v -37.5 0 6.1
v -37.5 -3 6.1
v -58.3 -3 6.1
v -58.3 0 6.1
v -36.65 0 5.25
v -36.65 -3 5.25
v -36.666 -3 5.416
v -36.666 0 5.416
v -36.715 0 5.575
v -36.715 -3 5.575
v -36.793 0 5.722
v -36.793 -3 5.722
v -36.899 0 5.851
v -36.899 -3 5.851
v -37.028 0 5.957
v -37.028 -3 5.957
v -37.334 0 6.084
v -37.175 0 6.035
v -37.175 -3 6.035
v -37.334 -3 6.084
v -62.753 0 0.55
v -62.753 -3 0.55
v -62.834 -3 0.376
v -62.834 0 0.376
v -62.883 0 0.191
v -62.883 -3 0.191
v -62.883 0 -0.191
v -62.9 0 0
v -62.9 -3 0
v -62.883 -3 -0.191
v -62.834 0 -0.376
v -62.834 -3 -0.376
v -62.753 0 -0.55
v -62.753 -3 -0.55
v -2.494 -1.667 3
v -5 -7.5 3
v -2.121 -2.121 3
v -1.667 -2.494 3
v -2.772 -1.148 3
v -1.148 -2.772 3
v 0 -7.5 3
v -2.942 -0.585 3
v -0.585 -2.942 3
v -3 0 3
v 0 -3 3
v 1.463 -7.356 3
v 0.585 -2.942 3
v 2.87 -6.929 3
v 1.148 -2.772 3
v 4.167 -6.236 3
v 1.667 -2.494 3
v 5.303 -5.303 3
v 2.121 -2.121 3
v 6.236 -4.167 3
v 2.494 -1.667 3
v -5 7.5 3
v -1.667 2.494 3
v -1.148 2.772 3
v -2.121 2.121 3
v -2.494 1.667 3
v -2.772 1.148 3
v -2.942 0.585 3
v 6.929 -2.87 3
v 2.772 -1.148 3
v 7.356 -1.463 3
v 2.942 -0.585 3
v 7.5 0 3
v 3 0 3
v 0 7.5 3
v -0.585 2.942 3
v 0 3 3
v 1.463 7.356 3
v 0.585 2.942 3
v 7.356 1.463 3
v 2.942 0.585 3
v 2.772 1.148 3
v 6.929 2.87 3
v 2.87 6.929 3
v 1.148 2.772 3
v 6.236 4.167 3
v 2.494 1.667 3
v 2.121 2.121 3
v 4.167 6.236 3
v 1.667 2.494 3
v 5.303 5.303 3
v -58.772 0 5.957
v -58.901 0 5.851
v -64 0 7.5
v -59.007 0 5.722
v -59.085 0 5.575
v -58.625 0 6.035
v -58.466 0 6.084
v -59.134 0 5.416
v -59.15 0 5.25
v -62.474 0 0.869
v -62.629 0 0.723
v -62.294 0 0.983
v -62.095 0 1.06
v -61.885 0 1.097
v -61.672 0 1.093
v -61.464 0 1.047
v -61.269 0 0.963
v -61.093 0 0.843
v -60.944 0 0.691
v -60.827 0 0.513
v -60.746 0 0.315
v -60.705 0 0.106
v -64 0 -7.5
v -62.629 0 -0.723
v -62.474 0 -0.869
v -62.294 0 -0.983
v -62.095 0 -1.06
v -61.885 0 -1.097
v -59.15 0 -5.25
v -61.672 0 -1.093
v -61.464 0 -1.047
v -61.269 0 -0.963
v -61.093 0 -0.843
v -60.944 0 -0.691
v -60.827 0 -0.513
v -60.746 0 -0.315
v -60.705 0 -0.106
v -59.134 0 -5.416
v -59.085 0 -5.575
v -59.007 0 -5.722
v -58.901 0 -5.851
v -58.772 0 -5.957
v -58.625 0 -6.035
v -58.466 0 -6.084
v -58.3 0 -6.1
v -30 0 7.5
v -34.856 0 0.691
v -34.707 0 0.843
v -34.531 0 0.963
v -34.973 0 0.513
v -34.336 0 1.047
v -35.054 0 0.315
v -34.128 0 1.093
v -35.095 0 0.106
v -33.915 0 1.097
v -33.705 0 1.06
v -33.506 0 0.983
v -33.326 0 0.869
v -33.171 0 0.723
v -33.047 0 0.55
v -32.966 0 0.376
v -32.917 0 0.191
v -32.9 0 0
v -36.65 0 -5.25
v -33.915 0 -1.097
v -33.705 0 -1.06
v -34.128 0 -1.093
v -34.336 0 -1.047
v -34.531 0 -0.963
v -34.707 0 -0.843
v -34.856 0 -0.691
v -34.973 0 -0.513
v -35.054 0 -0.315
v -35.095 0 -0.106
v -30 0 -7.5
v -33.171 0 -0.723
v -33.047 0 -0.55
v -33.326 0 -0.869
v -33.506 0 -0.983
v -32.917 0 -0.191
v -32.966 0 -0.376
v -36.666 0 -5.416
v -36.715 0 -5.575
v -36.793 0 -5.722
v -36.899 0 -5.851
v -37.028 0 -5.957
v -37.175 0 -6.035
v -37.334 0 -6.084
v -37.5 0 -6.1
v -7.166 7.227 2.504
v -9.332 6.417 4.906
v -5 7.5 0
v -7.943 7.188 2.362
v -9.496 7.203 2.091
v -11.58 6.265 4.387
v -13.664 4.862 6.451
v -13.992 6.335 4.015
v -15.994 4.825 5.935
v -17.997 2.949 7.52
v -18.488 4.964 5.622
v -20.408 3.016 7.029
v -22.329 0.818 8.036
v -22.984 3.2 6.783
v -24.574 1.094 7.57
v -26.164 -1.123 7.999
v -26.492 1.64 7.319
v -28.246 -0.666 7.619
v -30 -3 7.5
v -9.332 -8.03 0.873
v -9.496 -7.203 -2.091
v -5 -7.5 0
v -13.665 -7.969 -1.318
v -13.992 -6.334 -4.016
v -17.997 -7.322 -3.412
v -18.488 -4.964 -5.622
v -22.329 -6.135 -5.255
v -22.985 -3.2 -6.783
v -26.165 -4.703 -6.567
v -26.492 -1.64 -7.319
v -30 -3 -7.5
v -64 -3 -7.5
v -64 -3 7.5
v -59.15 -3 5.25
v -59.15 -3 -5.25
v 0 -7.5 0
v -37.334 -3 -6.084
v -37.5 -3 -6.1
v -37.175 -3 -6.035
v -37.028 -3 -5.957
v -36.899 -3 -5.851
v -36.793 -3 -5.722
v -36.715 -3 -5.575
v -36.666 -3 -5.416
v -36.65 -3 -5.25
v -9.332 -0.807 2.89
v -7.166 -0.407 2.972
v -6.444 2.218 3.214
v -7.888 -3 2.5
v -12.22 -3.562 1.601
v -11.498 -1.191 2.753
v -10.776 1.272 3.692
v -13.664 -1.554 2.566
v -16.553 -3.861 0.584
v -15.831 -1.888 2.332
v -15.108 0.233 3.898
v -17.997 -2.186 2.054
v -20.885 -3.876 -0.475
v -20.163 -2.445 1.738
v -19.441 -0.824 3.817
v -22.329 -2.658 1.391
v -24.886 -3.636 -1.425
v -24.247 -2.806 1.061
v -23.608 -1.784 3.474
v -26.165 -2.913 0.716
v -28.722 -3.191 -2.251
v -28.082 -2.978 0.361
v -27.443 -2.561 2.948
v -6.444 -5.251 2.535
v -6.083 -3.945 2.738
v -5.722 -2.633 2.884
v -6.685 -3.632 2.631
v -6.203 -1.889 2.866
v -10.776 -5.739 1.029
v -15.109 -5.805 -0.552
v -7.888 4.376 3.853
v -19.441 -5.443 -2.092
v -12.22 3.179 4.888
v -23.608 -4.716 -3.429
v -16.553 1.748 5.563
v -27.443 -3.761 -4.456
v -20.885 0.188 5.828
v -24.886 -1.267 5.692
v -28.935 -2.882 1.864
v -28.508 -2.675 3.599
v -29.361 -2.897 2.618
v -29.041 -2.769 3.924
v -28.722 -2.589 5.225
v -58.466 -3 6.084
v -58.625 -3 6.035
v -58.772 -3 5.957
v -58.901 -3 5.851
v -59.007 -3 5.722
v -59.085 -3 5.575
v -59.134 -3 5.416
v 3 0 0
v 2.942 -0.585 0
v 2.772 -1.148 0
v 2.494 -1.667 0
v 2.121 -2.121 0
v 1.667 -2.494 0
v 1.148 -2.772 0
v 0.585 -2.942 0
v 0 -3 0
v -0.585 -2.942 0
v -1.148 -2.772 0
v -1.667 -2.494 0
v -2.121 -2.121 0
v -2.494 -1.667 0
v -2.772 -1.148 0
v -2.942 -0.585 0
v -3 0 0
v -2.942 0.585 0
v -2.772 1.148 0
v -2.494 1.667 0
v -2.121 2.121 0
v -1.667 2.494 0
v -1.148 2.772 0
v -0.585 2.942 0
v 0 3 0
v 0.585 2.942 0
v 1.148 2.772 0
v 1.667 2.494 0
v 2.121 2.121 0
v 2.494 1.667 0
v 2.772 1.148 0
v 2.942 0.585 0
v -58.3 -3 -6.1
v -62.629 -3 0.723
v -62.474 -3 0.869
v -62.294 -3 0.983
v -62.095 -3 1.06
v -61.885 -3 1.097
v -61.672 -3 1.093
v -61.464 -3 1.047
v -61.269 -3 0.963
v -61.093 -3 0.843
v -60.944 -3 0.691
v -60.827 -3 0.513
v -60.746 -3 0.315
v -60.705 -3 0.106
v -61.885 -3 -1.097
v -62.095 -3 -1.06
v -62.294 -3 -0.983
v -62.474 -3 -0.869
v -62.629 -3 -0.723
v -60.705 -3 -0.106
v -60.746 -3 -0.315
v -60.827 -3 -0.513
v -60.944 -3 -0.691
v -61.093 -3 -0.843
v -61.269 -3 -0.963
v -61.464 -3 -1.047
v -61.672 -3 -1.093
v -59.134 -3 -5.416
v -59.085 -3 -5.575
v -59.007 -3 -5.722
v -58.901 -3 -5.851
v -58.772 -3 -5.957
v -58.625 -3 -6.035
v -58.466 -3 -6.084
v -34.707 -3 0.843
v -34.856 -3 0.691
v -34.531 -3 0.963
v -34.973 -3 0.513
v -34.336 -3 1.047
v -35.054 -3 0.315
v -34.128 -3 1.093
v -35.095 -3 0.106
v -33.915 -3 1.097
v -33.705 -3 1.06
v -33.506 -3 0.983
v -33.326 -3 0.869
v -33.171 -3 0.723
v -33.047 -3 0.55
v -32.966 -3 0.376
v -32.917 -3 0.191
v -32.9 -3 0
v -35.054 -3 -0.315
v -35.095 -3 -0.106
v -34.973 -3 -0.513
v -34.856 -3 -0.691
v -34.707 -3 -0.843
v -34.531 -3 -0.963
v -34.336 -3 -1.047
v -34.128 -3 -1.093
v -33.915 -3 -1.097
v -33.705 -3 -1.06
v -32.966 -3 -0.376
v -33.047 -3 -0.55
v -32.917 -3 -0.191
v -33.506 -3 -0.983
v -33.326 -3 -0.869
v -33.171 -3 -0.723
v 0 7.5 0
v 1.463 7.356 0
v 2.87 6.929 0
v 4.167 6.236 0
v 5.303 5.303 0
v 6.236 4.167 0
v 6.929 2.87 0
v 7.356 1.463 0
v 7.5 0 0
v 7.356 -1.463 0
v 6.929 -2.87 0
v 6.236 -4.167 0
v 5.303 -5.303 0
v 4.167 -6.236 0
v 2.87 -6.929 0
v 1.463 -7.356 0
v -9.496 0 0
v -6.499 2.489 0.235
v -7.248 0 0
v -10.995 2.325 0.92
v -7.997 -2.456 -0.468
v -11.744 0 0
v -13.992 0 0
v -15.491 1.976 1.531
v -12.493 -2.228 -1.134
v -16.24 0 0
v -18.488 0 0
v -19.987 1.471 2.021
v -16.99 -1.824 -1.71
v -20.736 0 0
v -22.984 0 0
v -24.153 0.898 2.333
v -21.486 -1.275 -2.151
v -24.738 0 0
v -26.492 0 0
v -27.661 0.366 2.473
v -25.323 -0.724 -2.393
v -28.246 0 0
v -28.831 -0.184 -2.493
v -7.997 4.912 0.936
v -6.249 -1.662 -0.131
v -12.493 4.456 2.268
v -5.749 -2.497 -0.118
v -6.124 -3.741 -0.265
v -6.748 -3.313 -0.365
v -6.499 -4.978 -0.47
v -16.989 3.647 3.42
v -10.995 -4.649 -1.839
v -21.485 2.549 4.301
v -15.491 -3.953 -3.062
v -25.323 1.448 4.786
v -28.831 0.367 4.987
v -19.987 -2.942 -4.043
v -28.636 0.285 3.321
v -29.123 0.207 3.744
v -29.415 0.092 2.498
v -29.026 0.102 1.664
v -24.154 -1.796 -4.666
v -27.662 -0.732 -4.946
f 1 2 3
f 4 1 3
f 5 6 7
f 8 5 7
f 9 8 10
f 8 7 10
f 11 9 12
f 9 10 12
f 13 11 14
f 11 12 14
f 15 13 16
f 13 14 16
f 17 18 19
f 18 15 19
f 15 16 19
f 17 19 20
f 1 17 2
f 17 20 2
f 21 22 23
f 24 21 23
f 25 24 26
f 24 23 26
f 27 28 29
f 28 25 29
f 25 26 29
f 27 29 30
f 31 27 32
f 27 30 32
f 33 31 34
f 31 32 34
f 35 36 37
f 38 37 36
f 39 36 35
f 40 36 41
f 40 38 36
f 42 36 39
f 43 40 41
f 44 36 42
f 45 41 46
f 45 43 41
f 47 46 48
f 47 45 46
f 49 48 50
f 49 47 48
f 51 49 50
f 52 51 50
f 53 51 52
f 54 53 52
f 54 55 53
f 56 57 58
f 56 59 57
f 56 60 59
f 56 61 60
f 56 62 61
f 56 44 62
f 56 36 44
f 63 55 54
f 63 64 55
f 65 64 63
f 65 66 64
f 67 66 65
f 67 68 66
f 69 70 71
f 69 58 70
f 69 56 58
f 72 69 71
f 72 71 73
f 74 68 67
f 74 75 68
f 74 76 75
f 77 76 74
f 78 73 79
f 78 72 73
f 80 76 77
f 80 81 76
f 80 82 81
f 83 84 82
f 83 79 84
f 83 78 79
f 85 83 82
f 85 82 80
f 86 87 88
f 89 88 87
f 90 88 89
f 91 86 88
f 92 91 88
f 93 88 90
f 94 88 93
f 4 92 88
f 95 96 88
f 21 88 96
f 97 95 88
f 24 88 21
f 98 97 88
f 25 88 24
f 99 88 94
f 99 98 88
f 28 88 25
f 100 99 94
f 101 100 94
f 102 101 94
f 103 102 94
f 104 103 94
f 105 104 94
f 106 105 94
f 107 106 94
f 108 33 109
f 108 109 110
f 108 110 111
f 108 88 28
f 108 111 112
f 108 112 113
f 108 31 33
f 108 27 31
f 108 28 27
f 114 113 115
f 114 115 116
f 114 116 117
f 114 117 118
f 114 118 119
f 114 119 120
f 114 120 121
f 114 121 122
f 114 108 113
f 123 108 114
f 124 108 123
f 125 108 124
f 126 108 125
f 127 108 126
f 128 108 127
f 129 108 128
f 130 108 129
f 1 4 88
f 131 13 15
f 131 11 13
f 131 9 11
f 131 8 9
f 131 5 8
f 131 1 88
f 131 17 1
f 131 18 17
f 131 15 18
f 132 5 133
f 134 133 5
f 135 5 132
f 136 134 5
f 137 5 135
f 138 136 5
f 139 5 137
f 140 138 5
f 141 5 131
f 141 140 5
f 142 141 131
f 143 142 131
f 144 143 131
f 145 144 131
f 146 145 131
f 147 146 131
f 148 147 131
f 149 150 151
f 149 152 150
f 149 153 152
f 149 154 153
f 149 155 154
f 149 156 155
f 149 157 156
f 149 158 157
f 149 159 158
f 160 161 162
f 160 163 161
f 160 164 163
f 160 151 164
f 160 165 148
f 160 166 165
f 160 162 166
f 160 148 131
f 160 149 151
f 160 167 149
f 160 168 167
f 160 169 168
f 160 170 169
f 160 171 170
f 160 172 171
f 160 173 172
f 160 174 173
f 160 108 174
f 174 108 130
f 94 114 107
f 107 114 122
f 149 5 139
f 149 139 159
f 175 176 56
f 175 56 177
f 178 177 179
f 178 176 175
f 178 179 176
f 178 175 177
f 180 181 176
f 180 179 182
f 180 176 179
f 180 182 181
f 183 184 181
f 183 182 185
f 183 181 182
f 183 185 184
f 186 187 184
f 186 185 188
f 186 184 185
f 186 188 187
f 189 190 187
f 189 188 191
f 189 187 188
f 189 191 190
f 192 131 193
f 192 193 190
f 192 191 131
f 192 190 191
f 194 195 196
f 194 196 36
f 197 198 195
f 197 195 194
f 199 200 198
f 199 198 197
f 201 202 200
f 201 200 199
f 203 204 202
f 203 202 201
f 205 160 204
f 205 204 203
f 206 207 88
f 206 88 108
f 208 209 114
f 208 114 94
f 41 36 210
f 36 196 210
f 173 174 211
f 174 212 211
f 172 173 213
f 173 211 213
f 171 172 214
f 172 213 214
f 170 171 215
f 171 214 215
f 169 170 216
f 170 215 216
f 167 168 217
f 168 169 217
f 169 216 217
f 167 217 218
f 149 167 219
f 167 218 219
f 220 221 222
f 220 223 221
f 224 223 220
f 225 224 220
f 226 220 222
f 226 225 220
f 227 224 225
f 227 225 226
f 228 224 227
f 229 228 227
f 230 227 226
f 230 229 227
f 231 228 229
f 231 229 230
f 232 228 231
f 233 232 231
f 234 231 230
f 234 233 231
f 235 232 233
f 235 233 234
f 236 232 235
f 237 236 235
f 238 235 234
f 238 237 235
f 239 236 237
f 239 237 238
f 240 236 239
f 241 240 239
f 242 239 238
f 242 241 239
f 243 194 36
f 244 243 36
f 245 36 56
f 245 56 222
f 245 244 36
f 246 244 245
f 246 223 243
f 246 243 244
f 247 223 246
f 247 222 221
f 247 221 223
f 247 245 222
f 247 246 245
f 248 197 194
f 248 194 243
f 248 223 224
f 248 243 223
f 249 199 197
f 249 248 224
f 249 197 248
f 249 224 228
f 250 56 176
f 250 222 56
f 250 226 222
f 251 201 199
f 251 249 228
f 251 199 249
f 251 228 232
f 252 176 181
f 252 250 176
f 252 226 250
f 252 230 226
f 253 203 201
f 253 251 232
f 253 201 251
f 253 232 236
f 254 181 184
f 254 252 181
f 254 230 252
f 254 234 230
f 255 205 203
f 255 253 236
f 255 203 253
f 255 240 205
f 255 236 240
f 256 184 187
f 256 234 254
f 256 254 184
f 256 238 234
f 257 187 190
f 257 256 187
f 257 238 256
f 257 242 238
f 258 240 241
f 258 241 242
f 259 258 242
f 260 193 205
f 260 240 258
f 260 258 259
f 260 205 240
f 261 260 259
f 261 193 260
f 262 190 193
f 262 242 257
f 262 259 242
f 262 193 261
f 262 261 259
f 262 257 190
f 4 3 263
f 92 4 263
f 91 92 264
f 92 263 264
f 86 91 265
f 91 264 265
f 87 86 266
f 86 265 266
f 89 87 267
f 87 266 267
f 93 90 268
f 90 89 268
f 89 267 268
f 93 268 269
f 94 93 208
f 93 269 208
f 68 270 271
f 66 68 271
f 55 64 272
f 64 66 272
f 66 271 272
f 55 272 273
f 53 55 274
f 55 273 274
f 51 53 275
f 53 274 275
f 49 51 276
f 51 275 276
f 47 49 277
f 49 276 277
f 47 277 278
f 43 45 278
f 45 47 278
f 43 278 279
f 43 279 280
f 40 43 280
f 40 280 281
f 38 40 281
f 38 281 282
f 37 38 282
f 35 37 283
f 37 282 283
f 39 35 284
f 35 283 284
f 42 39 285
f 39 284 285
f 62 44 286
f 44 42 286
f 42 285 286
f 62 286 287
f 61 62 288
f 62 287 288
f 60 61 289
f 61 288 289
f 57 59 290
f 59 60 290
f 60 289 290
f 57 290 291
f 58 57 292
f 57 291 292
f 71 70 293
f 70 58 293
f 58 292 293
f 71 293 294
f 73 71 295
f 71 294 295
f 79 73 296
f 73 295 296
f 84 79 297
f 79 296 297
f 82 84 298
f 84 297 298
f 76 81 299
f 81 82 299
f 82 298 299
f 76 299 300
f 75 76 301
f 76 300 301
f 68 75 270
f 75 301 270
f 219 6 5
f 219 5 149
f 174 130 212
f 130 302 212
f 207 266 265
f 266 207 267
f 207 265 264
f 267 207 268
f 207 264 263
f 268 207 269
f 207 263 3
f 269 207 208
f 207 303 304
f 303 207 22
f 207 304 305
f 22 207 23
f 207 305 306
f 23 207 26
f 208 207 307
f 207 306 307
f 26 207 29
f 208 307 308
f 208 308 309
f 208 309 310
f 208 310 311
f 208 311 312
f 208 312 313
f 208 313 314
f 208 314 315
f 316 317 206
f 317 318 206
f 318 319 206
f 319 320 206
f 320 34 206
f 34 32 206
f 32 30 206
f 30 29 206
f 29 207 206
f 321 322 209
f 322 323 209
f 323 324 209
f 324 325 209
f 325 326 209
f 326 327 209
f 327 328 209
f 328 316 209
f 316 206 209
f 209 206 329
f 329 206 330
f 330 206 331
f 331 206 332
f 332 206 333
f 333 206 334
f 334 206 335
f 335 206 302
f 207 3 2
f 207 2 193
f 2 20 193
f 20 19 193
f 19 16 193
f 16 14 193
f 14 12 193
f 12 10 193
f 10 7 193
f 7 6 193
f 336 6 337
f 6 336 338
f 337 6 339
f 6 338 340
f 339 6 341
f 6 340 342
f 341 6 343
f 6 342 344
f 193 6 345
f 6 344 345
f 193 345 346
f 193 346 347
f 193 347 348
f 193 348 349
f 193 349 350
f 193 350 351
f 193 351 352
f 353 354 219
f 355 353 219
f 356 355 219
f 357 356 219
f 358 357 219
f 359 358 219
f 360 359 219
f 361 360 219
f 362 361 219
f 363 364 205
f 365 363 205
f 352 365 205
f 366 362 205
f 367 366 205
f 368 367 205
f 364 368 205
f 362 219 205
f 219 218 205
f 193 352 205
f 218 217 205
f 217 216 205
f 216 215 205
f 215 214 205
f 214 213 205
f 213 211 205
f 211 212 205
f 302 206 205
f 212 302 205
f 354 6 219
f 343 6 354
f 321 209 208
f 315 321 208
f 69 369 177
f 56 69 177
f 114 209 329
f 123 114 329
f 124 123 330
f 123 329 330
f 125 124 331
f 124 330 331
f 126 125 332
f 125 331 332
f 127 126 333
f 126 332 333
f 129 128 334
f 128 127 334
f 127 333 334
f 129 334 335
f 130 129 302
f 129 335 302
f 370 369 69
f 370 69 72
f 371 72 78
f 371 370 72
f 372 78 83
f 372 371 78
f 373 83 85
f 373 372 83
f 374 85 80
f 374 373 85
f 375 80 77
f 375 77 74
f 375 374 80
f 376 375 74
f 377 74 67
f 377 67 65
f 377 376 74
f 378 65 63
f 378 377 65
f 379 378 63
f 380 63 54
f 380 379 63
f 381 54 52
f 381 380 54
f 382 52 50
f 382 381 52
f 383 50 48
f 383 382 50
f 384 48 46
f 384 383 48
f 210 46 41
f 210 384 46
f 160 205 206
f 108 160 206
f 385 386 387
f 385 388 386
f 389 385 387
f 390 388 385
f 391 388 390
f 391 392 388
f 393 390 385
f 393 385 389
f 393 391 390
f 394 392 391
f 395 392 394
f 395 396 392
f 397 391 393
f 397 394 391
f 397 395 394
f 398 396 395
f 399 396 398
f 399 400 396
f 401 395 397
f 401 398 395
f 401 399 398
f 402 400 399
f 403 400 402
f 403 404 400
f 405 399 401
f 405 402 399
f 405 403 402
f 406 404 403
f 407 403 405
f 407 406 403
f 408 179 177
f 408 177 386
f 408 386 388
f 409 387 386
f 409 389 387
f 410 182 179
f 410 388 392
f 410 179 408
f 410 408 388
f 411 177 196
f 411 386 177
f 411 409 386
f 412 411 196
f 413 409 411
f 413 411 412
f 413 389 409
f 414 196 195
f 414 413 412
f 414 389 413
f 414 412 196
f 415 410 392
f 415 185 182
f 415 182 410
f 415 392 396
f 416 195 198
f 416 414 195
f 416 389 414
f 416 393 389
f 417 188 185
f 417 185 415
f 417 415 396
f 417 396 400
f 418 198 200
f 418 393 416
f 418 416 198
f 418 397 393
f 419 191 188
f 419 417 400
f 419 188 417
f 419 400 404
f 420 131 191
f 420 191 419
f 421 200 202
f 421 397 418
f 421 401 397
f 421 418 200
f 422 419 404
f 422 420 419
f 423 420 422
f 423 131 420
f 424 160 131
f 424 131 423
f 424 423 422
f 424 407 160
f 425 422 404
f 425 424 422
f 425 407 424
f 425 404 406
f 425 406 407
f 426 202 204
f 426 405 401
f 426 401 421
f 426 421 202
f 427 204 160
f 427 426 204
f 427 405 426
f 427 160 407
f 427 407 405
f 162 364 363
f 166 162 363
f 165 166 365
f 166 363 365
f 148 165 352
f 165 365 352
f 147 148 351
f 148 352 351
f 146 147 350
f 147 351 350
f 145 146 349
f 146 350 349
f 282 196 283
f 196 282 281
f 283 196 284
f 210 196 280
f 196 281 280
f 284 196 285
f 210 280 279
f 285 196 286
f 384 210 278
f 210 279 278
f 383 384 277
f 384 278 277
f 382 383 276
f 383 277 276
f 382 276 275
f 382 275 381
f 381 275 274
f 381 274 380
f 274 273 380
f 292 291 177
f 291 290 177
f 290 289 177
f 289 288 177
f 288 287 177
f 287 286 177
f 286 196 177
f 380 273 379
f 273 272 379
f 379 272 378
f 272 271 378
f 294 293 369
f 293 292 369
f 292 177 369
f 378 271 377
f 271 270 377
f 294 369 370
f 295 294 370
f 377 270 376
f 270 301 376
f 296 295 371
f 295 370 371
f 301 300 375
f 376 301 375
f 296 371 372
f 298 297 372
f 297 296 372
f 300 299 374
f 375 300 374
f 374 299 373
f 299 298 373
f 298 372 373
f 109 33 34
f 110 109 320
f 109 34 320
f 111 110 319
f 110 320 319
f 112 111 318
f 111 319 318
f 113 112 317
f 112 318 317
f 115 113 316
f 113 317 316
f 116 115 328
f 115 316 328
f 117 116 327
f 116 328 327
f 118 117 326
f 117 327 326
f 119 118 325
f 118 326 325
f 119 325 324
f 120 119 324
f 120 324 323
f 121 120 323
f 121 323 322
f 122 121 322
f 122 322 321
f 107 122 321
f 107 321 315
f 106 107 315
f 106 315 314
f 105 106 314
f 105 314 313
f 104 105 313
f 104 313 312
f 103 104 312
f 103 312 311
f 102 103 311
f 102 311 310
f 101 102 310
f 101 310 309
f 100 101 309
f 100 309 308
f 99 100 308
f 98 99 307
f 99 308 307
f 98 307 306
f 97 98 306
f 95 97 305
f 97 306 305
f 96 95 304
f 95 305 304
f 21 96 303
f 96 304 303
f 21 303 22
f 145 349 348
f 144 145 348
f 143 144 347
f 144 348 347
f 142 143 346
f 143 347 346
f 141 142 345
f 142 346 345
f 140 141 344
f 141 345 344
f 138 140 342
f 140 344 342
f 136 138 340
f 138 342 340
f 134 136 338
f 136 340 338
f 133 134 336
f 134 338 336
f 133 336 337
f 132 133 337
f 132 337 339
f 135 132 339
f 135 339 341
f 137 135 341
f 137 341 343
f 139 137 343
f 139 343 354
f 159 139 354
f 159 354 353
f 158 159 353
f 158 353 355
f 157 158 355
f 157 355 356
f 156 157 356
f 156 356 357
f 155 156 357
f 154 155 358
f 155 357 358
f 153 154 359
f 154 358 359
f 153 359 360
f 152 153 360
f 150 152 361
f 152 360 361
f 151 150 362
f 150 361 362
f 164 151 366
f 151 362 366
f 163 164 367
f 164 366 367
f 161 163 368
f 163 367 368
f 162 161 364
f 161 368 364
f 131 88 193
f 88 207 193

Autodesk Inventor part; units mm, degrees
ref_plane "YZ Plane" through (0, 0, 0) normal (1, 0, 0) x (0, 1, 0)
ref_plane "XZ Plane" through (0, 0, 0) normal (0, 1, 0) x (-1, 0, 0)
sketch "Sketch1" plane through (0, 0, 0) normal (0, 0, 1) x (1, 0, 0)
  circle A0 centre (0, 0) radius 3
  circle A1 centre (0, 0) radius 7.5
  line L0 (0, 7.5) -> (-5, 7.5)
  line L1 (-5, 7.5) -> (-5, -7.5)
  line L2 (-5, -7.5) -> (0, -7.5)
  dimension "d30" = 5
extrude "Extrusion2" add sketch "Sketch1" along normal blind 3 contours A1 L1 | A1 L1 L0 | L2 L1 A1 picked at (-4.3333, 0)
sketch "Sketch5" plane through (-5, -7.5, 0) normal (-1, 0, 0) x (0, 0, 1)
  line L0 (0, 15) -> (0, 0) projected
  line L1 (0, 0) -> (3, 0) projected
  line L2 (3, 15) -> (3, 0) projected
  line L3 (0, 15) -> (3, 15) projected
  point P0 (0, 7.5)
coil "Coil2" sketch "Sketch5" operation add axis through (-10, 0, 0) along (-1, 0, 0) pitch 100 turns 0.25 hand left
ref_plane "Work Plane2" through (-30, -3, 7.5) normal (0, 1, 0) x (1, 0, 0)
sketch "Sketch6" plane through (-30, -3, 7.5) normal (0, 1, 0) x (1, 0, 0)
  arc A0 (-3.0474, 8.05) -> (-3.0474, 6.95) centre (-4, 7.5) ccw
  line L0 (-1.85, 8.05) -> (-1.85, 12.75)
  line L1 (-1.85, 2.25) -> (-1.85, 6.95)
  line L2 (-7.5, 1.4) -> (-2.7, 1.4)
  line L3 (-33.95, 6.95) -> (-33.95, 2.25)
  line L4 (-33.95, 12.75) -> (-33.95, 8.05)
  arc A1 (-32.7526, 6.95) -> (-32.7526, 8.05) centre (-31.8, 7.5) ccw
  line L5 (-33.95, 6.95) -> (-32.7526, 6.95)
  line L6 (-32.7526, 8.05) -> (-33.95, 8.05)
  line L7 (-28.3, 13.6) -> (-33.1, 13.6)
  line L8 (-2.7, 13.6) -> (-7.5, 13.6)
  arc A2 (-1.85, 12.75) -> (-2.7, 13.6) centre (-2.7, 12.75) ccw
  line L9 (-1.85, 8.05) -> (-3.0474, 8.05)
  line L10 (-3.0474, 6.95) -> (-1.85, 6.95)
  arc A3 (-2.7, 1.4) -> (-1.85, 2.25) centre (-2.7, 2.25) ccw
  arc A4 (-33.95, 2.25) -> (-33.1, 1.4) centre (-33.1, 2.25) ccw
  line L11 (-33.1, 1.4) -> (-28.3, 1.4)
  line L12 (-24.612, 1.4) -> (-28.3, 1.4)
  line L13 (-7.5, 1.4) -> (-21.488, 1.4)
  circle A5 centre (-23.05, 7.5) radius 2.25
  line L14 (-28.3, 13.6) -> (-24.612, 13.6)
  line L15 (-21.488, 13.6) -> (-7.5, 13.6)
  line L16 (-6.65, 2.25) -> (-6.65, 12.75)
  line L17 (-29.15, 12.75) -> (-29.15, 2.25)
  arc A6 (-29.15, 2.25) -> (-28.3, 1.4) centre (-28.3, 2.25) ccw
  arc A7 (-28.3, 13.6) -> (-29.15, 12.75) centre (-28.3, 12.75) ccw
  arc A8 (-33.1, 13.6) -> (-33.95, 12.75) centre (-33.1, 12.75) ccw
  arc A9 (-7.5, 1.4) -> (-6.65, 2.25) centre (-7.5, 2.25) ccw
  arc A10 (-6.65, 12.75) -> (-7.5, 13.6) centre (-7.5, 12.75) ccw
  line L18 (-24.612, 13.6) -> (-21.488, 13.6)
  line L19 (-21.488, 1.4) -> (-24.612, 1.4)
  line L20 (0, 0) -> (0, 15) projected
  line L21 (0, 15) -> (-4, 15)
  line L22 (-4, 15) -> (-4, 0)
  line L23 (-4, 0) -> (0, 0)
  line L24 (-4, 0) -> (-34, 0)
  line L25 (-34, 0) -> (-34, 15)
  line L26 (-34, 15) -> (-4, 15)
  circle A11 centre (-31.8, 7.5) radius 1.1
  circle A12 centre (-4, 7.5) radius 1.1
  point P0 (30, 7.5)
  point P1 (-32.7526, 8.05)
  point P2 (-3.0474, 8.05)
extrude "Extrusion3" add sketch "Sketch6" along normal blind 3 contours A0 L22 L8 A2 L0 L9 | L9 L0 A2 L8 L22 L21 L20 L23 L2 A3 L1 L10 A12 | A0 L22 L2 A9 L16 A10 L8 | A0 L10 L1 A3 L2 L22 | L8 L15 L18 L14 L7 A8 L4 L6 A11 L5 L3 A4 L11 L12 L19 L13 L2 L22 L24 L25 L26 | A7 L17 A6 L11 A4 L3 L5 A1 L6 L4 A8 L7
properties part number "tail"
